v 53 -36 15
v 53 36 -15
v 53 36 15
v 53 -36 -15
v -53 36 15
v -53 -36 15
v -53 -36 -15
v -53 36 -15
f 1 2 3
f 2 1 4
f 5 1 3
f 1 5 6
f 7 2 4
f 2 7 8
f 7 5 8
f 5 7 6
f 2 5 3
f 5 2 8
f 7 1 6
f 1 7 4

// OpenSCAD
// Bench rack for 1.5 mL microcentrifuge tubes
// Dimensions in millimetres

// Overall block dimensions
length_x = 106;   // Length along X axis
width_y = 72;     // Width along Y axis
height_z = 30;    // Height along Z axis

// Hole grid parameters
hole_diameter = 11.2;         // Diameter of each hole
hole_depth = 25;            // Depth of each hole (from top surface)
floor_thickness = 5;          // Solid floor thickness at bottom of hole
hole_spacing_x = 16;         // Centre-to-centre spacing along X
hole_spacing_y = 16;          // Centre-to-centre spacing along Y
num_holes_x = 6;            // Number of holes along X (columns)
num_holes_y = 4;            // Number of holes along Y (rows)

// Calculate centre of hole grid
grid_centre_x = length_x / 2;
grid_centre_y = width_y / 2;

// Calculate starting X and Y positions for the first hole
// to centre the grid
start_x = grid_centre_x - ((num_holes_x - 1) * hole_spacing_x) / 2;
start_y = grid_centre_y - ((num_holes_y - 1) * hole_spacing_y) / 2;

// Set resolution for smooth holes
$fn = 64;

// Main block
module bench_rack() {
    difference() {
        // Solid block
        cube([length_x, width_y, height_z], center = true);

        // Cut out holes
        for (i = [0 : num_holes_x - 1]) {
            for (j = [0 : num_holes_y - 1]) {
                // Calculate hole centre
                hole_x = start_x + i * hole_spacing_x;
                hole_y = start_y + j * hole_spacing_y;

                // Cut a cylinder from top to bottom, but only down to floor_thickness
                // Extend slightly beyond to ensure clean difference
                translate([hole_x, hole_y, height_z - 0.01]) {
                    cylinder(h = height_z + 0.01, d = hole_diameter, center = false);
                }
            }
        }
    }
}

// Render the bench rack
bench_rack();
